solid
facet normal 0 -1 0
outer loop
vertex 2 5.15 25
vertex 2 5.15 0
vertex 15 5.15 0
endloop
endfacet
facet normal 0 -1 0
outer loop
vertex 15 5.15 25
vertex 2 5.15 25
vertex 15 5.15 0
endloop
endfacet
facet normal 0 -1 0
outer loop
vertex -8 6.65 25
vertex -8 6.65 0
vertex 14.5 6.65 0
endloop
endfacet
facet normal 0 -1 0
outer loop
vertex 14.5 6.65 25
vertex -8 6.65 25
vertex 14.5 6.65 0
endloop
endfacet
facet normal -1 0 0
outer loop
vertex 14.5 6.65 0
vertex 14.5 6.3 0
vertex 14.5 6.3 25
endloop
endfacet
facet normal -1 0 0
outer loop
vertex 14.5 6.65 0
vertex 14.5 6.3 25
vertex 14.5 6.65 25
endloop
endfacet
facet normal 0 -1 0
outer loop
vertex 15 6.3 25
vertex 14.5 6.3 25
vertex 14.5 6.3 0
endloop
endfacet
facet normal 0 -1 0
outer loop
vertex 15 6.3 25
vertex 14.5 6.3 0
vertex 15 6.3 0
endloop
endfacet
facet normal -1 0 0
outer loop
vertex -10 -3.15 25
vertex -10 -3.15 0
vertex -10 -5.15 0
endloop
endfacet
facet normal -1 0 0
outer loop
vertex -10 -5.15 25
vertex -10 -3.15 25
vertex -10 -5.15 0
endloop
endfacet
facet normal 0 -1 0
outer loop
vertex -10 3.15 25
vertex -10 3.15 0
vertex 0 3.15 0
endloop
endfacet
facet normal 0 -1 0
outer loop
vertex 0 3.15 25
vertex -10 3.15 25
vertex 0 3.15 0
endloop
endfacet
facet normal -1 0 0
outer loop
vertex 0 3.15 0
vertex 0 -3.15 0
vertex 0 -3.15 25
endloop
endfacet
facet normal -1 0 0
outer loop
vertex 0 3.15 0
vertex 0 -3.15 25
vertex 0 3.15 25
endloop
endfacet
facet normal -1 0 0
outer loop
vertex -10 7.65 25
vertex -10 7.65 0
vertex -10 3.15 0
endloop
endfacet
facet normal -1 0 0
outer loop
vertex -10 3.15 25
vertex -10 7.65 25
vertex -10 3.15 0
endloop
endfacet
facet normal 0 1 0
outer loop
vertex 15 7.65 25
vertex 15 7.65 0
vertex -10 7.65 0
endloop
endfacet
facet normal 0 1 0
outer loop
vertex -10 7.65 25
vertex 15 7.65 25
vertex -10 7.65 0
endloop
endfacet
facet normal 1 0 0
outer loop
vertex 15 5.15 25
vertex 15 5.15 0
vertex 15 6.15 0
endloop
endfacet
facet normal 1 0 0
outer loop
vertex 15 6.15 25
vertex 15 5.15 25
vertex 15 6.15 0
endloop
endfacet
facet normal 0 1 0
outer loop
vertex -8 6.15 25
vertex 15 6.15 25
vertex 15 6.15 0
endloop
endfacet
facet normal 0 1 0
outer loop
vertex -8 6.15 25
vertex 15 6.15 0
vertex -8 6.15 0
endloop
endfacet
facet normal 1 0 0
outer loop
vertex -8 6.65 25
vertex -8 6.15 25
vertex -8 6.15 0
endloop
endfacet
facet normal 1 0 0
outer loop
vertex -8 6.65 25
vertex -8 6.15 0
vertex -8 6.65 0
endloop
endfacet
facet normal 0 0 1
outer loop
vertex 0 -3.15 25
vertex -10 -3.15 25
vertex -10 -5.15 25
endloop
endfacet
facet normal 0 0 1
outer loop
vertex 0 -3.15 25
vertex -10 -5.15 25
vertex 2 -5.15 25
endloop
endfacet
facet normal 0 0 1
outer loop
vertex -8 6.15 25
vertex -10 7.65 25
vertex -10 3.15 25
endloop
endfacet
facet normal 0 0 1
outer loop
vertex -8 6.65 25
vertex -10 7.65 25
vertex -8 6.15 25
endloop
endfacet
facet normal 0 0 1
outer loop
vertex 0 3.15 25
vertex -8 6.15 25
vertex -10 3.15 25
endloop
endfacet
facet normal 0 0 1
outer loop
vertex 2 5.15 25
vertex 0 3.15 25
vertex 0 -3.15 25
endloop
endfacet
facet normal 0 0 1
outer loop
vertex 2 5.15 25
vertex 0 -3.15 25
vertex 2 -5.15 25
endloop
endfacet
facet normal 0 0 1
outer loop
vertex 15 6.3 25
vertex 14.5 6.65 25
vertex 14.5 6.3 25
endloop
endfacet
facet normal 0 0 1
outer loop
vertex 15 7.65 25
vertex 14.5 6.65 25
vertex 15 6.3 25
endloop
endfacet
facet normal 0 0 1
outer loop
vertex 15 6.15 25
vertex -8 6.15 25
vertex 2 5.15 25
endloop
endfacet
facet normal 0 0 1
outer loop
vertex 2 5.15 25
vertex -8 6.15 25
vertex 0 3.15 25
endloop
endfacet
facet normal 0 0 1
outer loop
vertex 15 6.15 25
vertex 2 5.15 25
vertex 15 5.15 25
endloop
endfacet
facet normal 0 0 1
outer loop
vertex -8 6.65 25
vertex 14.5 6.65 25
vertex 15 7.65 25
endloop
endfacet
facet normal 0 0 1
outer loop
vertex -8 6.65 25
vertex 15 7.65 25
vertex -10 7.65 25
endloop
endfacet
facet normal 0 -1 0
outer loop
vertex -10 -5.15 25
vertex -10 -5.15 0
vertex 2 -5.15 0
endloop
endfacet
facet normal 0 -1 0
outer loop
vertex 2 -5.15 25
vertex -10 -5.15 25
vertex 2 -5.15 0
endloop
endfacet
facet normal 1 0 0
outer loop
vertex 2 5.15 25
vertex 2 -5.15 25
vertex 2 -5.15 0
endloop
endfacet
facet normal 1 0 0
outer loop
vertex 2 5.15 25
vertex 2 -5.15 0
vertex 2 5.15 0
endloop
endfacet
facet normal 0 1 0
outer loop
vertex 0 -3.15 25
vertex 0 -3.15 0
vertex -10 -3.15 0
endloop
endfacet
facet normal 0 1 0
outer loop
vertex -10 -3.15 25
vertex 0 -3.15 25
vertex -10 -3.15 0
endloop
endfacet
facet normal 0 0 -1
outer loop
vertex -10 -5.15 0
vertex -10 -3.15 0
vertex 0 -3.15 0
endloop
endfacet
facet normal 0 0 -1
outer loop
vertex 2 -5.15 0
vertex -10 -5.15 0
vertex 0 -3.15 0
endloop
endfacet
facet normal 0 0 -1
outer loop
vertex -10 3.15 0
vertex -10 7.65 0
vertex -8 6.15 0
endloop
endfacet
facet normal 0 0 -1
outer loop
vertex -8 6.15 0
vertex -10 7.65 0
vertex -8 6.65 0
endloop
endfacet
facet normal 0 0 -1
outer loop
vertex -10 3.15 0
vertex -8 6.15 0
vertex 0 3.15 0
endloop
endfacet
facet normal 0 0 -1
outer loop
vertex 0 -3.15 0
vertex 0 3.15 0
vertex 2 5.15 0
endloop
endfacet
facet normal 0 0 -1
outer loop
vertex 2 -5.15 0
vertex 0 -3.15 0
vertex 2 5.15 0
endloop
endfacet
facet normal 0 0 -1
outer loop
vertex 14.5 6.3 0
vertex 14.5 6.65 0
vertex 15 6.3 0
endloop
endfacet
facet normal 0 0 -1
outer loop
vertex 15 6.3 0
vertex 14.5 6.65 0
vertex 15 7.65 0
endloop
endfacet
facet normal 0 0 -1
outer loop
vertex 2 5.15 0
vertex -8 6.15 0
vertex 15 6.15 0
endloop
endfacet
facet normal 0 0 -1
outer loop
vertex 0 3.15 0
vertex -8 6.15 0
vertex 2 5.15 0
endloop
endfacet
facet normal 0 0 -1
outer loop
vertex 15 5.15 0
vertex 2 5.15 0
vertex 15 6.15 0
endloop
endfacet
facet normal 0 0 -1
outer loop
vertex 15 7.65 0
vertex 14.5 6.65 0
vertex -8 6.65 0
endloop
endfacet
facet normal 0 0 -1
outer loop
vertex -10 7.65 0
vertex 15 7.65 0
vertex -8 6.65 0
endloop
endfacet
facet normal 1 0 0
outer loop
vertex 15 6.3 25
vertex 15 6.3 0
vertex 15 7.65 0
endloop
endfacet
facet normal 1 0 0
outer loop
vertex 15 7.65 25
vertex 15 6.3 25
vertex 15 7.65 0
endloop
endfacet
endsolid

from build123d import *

# Parameters (mm, degrees)
F0_W     = 2
F0_H     = 0.5
F0_H_2   = 6.3
F0_W_2   = 0.5
F0_H_3   = 0.35
F1_DEPTH = 25


with BuildPart() as f1:
    # F0 (on Top) → F1 (new body)
    with BuildSketch(Plane.XY):
        Polygon((-10, 6.15), (-10, 5.15), (2, 5.15), (15, 5.15), (15, 6.15), (-8, 6.15), align=None)
        Polygon((2, 5.15), (-10, 5.15), (-10, 3.15), (0, 3.15), (2, 3.15), align=None)
        with Locations((-9, 6.4)):
            Rectangle(F0_W, F0_H)
        with Locations((1, 0)):
            Rectangle(F0_W, F0_H_2)
        Polygon((-10, 7.65), (-10, 6.65), (-8, 6.65), (14.5, 6.65), (15, 6.65), (15, 7.65), align=None)
        Polygon((2, -5.15), (2, -3.15), (0, -3.15), (-10, -3.15), (-10, -5.15), align=None)
        with Locations((14.75, 6.475)):
            Rectangle(F0_W_2, F0_H_3)
    extrude(amount=F1_DEPTH)


solid = f1.part
